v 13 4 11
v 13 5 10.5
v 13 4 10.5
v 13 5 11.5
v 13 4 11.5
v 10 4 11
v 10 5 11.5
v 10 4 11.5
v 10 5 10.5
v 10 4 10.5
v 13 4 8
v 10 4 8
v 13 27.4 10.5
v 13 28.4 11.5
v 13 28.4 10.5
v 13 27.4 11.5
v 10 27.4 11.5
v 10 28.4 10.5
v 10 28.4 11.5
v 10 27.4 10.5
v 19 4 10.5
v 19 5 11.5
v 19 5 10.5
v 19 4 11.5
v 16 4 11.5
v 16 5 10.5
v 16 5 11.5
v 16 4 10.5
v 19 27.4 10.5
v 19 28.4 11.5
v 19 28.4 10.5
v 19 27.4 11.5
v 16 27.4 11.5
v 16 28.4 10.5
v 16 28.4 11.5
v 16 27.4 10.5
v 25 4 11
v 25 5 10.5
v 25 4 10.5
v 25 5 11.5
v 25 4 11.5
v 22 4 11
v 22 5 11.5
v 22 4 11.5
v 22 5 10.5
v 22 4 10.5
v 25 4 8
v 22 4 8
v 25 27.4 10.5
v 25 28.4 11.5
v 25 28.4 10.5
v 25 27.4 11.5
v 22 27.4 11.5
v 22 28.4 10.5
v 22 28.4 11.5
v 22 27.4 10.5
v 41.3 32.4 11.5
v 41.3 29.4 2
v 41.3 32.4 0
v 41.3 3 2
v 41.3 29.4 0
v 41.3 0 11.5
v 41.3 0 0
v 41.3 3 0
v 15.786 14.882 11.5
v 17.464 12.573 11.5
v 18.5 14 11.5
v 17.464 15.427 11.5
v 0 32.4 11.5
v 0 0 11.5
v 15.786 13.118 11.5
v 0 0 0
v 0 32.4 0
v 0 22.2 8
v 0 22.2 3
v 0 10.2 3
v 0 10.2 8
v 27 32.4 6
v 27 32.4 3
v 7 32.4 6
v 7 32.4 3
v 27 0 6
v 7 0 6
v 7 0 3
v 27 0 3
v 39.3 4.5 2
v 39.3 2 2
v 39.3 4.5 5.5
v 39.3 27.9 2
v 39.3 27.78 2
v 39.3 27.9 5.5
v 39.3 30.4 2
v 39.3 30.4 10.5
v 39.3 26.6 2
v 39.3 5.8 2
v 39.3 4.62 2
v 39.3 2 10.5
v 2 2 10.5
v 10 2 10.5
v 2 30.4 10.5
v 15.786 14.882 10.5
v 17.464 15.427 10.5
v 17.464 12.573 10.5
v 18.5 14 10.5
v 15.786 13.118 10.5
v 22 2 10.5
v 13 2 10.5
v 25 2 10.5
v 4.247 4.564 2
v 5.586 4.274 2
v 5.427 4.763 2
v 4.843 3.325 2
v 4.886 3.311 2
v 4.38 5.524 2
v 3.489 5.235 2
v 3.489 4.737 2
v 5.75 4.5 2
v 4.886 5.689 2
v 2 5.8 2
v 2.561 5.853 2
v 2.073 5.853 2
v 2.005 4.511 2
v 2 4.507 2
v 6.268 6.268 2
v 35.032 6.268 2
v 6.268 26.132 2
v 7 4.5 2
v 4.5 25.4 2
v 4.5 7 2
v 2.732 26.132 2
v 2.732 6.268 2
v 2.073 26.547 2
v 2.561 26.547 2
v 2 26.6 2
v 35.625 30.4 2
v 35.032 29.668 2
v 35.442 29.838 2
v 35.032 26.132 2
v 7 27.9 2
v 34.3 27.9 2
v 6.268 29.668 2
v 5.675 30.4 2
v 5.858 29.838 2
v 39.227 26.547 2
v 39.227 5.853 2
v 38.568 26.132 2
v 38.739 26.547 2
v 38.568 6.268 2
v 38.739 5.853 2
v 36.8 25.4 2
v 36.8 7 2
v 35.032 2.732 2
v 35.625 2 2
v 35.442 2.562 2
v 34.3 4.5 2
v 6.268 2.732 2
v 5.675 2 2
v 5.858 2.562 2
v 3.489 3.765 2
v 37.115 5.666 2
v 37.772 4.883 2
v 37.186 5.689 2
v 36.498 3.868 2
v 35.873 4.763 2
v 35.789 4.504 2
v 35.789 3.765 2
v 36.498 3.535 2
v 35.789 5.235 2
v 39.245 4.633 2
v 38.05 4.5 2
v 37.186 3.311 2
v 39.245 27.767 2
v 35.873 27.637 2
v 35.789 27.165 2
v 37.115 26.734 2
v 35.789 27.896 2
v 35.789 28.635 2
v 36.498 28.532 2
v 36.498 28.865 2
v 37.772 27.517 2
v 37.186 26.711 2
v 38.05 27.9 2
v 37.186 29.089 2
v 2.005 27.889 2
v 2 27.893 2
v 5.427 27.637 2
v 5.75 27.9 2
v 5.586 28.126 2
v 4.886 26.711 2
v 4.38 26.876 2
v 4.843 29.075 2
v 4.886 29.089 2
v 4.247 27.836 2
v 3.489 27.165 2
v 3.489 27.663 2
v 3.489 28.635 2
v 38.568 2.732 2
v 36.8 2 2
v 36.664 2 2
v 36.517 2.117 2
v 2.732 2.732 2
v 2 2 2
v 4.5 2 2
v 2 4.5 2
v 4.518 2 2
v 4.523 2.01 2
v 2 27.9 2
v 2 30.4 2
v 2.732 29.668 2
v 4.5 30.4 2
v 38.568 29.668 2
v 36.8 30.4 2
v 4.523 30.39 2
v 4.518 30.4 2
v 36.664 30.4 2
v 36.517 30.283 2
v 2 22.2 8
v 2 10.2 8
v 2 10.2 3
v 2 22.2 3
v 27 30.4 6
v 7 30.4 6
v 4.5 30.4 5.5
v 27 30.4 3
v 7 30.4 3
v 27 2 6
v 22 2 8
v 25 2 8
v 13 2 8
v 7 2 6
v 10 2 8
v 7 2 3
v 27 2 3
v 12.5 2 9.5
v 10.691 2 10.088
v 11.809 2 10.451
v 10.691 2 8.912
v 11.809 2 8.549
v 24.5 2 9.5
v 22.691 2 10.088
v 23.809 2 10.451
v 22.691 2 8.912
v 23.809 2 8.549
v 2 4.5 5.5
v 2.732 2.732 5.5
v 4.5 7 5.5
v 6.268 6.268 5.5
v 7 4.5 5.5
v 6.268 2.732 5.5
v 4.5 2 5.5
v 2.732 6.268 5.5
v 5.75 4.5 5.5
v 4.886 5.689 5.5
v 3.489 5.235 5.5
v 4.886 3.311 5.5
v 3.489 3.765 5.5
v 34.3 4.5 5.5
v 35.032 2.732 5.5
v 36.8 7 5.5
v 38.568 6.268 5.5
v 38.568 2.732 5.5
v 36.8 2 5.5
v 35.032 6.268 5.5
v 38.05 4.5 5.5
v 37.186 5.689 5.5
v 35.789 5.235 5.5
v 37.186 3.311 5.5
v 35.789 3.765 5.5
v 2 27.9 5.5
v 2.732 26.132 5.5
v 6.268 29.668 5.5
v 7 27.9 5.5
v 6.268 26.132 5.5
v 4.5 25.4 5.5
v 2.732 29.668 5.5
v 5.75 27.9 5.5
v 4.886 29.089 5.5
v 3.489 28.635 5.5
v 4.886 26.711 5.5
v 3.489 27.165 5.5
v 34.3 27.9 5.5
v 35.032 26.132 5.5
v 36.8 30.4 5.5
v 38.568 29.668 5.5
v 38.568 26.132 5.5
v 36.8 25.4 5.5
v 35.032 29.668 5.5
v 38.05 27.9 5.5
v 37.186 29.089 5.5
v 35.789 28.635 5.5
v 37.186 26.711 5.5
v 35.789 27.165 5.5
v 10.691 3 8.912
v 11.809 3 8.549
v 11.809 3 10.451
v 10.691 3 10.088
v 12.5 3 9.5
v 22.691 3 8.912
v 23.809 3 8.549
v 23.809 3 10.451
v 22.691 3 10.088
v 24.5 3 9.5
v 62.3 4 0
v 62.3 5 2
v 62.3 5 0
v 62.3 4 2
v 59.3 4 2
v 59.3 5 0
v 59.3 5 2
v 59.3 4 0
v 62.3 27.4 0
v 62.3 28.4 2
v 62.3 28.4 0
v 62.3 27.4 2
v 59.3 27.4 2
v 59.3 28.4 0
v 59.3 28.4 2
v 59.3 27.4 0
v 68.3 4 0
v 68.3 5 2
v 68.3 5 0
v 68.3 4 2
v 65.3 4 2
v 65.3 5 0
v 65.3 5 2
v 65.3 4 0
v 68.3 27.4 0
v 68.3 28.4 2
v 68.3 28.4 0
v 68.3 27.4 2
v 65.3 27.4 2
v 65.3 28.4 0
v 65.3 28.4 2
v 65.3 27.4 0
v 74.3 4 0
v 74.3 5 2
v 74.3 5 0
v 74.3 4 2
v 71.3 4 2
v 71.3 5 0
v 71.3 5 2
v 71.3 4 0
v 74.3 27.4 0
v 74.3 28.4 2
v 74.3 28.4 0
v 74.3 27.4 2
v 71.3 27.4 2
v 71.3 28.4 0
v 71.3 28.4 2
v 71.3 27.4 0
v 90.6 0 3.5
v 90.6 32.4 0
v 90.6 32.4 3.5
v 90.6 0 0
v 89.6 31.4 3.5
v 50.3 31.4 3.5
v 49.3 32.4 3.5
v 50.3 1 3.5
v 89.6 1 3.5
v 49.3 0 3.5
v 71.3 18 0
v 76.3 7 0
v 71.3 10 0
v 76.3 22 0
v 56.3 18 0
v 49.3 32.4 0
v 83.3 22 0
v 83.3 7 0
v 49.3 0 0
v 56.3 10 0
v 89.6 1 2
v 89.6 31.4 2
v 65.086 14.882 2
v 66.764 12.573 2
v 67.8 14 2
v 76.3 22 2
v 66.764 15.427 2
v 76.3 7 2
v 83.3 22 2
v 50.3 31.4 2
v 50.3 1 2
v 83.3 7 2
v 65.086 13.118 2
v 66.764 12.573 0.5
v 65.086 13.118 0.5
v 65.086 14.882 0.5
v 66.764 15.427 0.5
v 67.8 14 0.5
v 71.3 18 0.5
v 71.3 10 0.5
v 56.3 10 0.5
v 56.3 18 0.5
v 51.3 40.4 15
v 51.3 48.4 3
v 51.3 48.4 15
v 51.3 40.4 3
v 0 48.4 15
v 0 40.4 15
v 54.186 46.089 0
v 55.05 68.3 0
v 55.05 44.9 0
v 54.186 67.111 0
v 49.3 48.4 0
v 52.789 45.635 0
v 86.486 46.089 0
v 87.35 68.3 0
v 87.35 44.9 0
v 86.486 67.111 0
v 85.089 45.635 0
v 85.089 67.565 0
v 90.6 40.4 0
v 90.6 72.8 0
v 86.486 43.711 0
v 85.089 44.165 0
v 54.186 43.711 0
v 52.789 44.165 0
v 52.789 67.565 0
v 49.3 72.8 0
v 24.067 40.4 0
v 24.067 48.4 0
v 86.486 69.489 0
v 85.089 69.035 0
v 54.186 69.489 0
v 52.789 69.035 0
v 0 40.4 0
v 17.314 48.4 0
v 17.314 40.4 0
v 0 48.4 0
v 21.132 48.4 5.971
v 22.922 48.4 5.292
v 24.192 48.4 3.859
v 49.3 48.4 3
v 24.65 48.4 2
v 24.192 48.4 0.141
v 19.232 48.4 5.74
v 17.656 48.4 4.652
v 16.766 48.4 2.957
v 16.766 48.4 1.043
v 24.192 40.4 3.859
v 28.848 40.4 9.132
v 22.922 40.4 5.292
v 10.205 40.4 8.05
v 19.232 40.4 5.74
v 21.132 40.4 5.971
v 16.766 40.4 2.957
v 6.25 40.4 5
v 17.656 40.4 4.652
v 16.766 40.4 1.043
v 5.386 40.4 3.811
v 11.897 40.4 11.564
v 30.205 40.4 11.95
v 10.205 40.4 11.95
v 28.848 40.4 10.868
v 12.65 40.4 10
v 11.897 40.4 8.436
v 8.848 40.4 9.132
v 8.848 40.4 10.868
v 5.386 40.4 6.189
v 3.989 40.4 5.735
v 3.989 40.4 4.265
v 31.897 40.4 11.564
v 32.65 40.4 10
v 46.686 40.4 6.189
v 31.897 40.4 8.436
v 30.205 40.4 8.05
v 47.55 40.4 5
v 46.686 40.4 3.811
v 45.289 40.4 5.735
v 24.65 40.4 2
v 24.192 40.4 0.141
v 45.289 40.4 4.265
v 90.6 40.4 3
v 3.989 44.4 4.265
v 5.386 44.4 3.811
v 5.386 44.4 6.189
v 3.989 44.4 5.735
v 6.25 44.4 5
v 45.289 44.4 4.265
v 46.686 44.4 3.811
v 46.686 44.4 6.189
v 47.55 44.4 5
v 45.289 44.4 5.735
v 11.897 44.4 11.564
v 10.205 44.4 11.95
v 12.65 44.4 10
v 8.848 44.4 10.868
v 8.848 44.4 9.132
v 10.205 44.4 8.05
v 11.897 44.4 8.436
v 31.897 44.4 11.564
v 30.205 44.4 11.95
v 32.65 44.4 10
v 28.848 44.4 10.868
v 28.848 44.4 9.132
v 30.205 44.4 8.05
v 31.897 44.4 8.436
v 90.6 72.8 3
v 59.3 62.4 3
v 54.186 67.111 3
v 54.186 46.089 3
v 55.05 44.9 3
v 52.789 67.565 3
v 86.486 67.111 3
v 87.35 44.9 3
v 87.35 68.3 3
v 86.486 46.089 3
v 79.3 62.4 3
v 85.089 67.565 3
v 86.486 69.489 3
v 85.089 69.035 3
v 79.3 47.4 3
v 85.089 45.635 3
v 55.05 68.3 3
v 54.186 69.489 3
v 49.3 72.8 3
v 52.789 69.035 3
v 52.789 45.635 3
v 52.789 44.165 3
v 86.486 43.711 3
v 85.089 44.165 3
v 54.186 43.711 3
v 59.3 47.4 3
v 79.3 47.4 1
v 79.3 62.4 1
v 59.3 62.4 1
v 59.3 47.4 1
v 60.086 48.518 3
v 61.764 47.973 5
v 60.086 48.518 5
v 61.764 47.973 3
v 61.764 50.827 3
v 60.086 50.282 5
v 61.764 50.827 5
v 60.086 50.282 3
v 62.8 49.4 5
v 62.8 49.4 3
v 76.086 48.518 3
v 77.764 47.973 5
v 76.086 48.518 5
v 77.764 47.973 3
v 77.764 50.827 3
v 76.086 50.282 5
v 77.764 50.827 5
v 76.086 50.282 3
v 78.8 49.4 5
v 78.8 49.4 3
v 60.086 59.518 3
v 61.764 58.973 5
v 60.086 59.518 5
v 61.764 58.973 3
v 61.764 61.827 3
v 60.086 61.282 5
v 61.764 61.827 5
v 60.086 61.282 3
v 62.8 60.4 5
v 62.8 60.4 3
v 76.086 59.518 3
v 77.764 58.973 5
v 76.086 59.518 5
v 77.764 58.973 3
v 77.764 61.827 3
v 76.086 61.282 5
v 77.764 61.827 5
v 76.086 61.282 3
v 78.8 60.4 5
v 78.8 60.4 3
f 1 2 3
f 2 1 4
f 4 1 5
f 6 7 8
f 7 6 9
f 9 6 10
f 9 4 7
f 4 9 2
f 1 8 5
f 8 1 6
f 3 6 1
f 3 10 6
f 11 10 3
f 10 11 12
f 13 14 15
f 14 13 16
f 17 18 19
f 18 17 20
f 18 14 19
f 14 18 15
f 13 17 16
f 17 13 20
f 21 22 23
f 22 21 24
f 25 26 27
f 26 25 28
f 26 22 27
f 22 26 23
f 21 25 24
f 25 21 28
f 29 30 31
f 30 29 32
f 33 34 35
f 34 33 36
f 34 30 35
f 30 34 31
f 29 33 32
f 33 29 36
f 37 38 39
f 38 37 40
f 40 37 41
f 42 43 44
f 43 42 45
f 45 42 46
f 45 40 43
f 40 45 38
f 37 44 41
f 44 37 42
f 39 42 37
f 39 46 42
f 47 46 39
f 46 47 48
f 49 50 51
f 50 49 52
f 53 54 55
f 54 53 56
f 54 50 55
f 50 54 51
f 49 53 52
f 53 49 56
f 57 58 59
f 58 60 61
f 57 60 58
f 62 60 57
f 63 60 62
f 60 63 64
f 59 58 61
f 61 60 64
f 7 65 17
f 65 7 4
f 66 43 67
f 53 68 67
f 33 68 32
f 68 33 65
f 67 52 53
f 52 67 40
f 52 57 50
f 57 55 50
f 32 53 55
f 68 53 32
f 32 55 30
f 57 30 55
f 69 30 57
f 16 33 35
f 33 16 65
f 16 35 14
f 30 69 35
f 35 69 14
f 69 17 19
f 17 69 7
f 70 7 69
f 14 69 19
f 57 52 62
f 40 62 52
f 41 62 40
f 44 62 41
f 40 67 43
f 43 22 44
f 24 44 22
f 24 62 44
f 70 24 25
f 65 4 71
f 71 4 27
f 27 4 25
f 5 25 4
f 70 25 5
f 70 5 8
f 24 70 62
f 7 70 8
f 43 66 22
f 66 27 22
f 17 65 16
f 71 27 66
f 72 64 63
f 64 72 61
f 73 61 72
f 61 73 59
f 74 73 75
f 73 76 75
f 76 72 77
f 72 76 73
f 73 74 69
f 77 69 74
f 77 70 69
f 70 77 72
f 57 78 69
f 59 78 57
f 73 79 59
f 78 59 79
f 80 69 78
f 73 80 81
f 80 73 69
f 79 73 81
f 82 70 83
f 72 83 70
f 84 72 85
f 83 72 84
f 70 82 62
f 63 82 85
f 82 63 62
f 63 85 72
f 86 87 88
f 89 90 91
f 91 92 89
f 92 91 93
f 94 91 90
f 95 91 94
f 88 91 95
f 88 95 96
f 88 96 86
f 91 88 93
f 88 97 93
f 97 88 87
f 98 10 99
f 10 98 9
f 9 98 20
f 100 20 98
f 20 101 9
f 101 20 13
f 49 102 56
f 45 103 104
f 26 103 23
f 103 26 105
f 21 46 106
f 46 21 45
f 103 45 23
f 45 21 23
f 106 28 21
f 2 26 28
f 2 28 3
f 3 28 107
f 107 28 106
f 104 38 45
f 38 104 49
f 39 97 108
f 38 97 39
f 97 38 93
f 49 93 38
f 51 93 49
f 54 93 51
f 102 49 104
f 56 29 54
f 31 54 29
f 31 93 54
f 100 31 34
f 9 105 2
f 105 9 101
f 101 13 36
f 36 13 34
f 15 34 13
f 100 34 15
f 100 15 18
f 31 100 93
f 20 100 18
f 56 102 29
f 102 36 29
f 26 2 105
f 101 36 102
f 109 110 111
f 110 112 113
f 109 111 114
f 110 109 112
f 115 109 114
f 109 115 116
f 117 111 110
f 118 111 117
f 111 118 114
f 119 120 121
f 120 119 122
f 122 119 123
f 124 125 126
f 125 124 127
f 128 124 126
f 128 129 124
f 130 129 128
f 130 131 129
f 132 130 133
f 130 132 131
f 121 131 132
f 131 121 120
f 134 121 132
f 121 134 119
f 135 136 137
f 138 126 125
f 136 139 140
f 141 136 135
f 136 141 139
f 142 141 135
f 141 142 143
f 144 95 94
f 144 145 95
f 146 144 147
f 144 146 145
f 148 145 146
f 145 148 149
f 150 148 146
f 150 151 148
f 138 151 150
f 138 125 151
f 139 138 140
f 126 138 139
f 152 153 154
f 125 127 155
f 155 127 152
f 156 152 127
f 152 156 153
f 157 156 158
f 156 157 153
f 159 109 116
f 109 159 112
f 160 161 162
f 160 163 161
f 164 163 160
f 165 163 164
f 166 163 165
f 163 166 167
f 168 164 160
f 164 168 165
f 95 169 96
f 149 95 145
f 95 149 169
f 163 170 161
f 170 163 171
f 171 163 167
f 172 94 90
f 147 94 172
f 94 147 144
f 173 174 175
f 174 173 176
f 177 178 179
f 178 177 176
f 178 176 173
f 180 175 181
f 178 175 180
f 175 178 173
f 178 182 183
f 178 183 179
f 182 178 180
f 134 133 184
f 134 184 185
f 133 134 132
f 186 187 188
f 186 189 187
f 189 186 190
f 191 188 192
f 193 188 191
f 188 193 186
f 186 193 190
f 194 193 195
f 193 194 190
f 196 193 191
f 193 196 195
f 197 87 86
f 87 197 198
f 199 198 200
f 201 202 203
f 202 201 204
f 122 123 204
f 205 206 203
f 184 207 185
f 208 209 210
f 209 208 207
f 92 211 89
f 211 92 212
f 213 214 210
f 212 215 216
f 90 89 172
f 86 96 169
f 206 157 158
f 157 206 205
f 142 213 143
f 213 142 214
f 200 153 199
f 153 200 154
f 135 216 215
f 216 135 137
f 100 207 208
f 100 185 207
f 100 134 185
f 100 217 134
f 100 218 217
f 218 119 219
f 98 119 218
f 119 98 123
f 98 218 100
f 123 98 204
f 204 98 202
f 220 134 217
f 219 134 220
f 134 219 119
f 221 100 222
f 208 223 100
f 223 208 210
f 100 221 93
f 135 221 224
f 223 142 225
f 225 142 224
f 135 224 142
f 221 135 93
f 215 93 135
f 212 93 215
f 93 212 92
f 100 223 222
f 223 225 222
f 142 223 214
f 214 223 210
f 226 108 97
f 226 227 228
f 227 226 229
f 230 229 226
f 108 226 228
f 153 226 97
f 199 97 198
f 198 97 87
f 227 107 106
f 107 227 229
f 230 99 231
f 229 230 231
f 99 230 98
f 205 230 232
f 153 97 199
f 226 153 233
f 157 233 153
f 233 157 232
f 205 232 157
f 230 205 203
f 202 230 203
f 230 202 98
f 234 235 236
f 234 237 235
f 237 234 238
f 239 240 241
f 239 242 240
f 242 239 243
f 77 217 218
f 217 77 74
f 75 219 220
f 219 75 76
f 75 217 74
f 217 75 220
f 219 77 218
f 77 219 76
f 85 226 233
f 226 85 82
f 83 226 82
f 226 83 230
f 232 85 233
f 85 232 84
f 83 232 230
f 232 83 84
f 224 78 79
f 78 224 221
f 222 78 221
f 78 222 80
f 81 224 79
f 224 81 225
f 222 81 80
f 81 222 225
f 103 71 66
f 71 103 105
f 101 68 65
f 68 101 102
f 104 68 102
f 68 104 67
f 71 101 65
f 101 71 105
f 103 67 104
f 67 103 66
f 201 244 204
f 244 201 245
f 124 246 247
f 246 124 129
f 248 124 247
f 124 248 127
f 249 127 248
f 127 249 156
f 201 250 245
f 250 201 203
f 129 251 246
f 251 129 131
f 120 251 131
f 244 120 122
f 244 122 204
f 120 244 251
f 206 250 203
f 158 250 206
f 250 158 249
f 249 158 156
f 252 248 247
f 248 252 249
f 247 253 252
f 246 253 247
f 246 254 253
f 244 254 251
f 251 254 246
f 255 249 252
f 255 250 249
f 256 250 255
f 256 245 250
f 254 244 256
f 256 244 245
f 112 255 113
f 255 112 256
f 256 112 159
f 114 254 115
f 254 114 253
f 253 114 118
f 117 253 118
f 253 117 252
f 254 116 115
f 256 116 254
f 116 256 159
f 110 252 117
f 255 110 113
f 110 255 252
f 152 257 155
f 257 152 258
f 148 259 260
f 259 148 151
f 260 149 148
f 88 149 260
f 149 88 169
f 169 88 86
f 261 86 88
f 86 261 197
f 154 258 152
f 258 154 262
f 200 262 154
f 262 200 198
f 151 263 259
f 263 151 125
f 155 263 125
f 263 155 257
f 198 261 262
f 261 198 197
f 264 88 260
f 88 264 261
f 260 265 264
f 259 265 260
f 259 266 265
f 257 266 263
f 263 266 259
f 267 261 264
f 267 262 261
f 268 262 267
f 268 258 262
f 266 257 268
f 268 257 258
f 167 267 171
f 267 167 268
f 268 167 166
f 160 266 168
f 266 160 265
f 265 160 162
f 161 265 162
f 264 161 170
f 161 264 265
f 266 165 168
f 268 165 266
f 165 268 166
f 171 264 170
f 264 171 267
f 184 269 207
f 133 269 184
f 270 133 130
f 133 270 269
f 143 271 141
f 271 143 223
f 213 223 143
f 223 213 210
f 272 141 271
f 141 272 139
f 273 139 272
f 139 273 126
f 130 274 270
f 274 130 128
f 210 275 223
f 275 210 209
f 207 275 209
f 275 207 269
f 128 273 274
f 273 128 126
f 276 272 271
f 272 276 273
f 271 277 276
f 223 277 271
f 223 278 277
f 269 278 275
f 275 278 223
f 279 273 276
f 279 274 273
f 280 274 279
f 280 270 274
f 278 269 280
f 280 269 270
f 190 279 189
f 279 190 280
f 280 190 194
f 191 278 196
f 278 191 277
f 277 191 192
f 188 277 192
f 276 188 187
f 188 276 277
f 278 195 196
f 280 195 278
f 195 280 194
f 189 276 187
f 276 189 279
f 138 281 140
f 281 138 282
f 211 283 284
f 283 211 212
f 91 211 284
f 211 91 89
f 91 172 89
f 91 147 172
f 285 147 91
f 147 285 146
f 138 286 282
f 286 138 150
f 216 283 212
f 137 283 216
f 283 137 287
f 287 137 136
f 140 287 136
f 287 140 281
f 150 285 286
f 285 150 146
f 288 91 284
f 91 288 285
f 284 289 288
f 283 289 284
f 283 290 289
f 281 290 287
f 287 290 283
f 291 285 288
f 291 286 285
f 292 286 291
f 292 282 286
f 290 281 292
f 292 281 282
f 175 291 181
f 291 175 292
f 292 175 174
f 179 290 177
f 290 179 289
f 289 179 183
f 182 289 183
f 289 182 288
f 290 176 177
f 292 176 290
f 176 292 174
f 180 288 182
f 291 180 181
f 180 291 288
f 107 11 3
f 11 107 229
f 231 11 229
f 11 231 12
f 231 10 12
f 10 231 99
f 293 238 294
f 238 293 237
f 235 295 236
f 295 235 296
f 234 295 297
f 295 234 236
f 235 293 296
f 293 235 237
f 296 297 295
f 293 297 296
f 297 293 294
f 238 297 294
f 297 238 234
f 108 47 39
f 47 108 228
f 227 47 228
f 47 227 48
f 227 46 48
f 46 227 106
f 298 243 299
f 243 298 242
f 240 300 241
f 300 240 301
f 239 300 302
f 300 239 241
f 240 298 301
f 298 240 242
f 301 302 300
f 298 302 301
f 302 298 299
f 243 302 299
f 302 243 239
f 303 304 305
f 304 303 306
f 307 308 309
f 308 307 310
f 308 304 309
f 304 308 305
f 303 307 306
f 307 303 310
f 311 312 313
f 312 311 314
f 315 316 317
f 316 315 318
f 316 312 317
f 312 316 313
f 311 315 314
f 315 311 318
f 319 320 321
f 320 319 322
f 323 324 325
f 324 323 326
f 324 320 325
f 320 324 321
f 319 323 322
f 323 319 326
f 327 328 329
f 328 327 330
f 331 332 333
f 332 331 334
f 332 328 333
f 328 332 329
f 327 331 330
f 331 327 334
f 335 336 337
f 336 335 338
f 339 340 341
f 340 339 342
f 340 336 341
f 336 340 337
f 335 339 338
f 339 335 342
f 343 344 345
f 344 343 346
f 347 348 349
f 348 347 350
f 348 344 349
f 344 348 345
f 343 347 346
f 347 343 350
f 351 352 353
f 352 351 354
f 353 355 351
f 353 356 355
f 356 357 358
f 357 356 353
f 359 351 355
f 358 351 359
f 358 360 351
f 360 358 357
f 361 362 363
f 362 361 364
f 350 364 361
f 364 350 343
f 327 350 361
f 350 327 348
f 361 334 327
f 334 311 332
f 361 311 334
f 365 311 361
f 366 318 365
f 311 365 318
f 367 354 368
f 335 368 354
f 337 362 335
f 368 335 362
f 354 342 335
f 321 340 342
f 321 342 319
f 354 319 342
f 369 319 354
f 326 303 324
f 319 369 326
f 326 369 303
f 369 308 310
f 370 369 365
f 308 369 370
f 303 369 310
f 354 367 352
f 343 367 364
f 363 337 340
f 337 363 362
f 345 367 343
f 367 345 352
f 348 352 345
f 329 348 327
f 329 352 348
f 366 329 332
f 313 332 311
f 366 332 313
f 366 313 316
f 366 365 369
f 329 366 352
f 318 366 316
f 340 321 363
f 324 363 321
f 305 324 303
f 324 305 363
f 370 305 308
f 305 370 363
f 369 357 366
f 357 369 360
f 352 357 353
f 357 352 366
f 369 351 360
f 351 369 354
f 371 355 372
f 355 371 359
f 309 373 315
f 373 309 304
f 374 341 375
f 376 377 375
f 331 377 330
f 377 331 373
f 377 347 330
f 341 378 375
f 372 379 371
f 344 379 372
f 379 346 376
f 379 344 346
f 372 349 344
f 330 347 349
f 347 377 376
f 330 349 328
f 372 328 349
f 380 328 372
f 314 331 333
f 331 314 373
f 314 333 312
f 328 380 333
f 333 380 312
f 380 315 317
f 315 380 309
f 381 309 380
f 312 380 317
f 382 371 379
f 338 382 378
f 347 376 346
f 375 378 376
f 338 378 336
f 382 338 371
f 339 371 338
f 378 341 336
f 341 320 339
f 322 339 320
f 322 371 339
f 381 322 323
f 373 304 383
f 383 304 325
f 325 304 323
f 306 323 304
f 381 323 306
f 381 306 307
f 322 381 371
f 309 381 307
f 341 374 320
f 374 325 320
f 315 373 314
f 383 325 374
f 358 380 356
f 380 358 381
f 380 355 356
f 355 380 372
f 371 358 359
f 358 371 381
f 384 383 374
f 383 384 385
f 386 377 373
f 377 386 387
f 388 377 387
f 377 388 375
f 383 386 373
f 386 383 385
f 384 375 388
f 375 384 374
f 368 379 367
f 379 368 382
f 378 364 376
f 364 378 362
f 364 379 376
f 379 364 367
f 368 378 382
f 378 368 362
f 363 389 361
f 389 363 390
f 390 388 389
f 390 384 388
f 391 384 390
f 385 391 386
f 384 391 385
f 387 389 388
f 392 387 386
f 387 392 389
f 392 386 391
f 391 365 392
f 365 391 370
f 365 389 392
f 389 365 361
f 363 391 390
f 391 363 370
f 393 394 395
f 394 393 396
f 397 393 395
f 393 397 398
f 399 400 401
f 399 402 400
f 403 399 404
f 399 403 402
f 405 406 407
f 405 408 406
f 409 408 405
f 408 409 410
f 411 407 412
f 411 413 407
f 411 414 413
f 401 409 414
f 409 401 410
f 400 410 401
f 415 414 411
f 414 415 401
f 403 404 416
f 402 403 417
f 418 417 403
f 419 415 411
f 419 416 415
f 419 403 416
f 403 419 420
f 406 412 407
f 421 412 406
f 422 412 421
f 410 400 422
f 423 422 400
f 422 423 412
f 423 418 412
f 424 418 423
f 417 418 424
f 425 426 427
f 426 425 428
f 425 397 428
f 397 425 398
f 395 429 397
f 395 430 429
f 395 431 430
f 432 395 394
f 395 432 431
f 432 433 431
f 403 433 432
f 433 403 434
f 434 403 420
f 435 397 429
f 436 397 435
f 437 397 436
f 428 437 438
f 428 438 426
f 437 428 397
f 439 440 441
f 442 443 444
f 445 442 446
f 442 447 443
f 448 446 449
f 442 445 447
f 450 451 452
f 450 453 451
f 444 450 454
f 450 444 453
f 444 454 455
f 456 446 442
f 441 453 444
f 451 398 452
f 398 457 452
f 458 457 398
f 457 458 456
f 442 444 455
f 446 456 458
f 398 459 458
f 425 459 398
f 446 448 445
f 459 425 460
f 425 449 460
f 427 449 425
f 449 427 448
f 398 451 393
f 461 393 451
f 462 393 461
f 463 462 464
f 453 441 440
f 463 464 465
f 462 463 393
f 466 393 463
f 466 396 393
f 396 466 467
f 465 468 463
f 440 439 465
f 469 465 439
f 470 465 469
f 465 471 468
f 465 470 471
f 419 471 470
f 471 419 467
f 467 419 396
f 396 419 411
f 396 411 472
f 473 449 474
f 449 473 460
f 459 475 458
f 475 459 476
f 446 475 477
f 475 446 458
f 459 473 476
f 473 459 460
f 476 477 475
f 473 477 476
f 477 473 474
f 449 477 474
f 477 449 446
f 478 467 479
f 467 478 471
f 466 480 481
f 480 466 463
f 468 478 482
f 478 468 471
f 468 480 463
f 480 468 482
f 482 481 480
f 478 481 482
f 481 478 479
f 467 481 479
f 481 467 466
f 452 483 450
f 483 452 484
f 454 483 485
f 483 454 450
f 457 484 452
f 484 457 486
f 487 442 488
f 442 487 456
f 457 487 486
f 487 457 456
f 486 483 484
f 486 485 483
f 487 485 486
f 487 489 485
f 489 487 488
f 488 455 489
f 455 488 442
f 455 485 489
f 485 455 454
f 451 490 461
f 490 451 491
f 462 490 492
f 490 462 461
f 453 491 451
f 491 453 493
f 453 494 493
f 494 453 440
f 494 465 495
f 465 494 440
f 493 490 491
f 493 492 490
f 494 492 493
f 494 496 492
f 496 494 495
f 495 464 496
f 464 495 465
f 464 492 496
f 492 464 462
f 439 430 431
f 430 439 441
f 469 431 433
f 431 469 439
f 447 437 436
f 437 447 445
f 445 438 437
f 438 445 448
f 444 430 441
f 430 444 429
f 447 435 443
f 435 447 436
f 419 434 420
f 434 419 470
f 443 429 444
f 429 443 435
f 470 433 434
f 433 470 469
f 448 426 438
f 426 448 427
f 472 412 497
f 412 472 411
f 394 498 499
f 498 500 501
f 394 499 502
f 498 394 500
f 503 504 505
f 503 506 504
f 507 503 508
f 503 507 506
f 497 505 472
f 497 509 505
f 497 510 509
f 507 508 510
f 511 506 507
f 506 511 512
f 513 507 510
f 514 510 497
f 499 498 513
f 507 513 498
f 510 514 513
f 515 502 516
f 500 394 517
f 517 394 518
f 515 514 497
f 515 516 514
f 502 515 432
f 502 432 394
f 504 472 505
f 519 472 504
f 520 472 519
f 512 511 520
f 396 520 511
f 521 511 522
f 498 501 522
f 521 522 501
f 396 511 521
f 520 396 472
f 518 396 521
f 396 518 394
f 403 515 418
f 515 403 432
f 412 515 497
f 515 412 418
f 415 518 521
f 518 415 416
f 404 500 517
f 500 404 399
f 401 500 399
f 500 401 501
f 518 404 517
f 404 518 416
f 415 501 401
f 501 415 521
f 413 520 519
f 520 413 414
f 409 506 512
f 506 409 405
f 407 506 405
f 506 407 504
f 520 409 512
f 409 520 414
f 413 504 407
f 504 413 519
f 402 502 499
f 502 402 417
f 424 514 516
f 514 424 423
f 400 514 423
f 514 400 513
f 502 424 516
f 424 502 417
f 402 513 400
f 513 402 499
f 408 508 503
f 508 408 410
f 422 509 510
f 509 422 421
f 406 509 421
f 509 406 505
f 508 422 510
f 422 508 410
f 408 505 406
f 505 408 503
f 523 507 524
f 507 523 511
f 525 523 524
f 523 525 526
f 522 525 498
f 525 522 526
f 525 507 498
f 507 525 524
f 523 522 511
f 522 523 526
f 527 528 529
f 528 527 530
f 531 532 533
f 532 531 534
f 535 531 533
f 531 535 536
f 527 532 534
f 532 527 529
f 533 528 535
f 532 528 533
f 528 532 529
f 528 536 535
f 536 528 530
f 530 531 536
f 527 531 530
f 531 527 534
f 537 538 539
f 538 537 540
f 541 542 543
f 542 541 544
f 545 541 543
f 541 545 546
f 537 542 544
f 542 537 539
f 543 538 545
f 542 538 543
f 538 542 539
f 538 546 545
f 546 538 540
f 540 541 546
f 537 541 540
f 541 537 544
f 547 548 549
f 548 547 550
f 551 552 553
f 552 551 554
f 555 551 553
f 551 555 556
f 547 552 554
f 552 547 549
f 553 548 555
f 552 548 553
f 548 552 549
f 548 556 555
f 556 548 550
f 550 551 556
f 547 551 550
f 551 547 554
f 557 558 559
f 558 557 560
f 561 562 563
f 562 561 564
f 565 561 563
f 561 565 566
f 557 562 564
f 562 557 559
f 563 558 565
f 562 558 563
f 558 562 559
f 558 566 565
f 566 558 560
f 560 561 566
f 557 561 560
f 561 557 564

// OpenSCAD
// Carenuity C3 Mini v2.2.1 Case - 3D Printable
// Designed for ESP32-C3 IoT Development Board
// Board dimensions: 34.3 x 25.4 mm

// Main board dimensions (from specifications)
board_length = 34.3;   // Board length in mm
board_width = 25.4;    // Board width in mm  
board_thickness = 1.6; // PCB thickness in mm

// Case dimensions
case_wall = 2.0;       // Wall thickness (thinner for compact design)
case_floor = 2.0;      // Bottom thickness
case_ceiling = 2.0;    // Top thickness
case_clearance = 4;    // Space above components

// Component heights (estimated for C3 Mini)
esp32_height = 3;      // ESP32-C3 chip height
usb_connector_height = 3.5; // USB-C connector
led_height = 2;        // WS2812B RGB LED
pin_header_height = 8.5; // Female pin headers (when soldered)

// Calculate internal dimensions
internal_length = board_length + 3; // Compact clearance
internal_width = board_width + 3;
internal_height = max(esp32_height, usb_connector_height, pin_header_height) + case_clearance;

// External case dimensions
external_length = internal_length + (case_wall * 2);
external_width = internal_width + (case_wall * 2);
external_height = internal_height + case_floor + case_ceiling;

// Mounting post dimensions
post_diameter = 5;
post_height = case_floor + 1.5;
screw_hole_diameter = 2.5; // M2.5 screw (smaller for compact board)

// Connector cutout dimensions
usb_cutout_width = 12;
usb_cutout_height = 5;
pin_header_width = 20;
pin_header_height = 3;

module main_case() {
    difference() {
        // Outer case
        cube([external_length, external_width, external_height]);
        
        // Internal cavity
        translate([case_wall, case_wall, case_floor]) {
            cube([internal_length, internal_width, internal_height + 1]);
        }
        
        // USB-C connector cutout (end of board)
        translate([-1, case_wall + (internal_width - usb_cutout_width)/2, case_floor + 1]) {
            cube([case_wall + 2, usb_cutout_width, usb_cutout_height]);
        }
        
        // Pin header access (both sides)
        translate([case_wall + 5, -1, case_floor + 1]) {
            cube([pin_header_width, case_wall + 2, pin_header_height]);
        }
        translate([case_wall + 5, external_width - case_wall - 1, case_floor + 1]) {
            cube([pin_header_width, case_wall + 2, pin_header_height]);
        }
        
        // Antenna area (keep clear from metal)
        translate([case_wall + 25, case_wall + 5, case_floor]) {
            cube([7, 15, internal_height + 1]);
        }
        
        // Status LED window
        translate([case_wall + 15, case_wall + 12, external_height - case_ceiling]) {
            cylinder(d=3, h=case_ceiling + 1);
        }
        
        // Ventilation slots (minimal for compact design)
        for(x = [case_wall + 8:6:case_wall + 25]) {
            translate([x, case_wall + 2, external_height - case_ceiling]) {
                cube([3, 1, case_ceiling + 1]);
            }
            translate([x, external_width - case_wall - 3, external_height - case_ceiling]) {
                cube([3, 1, case_ceiling + 1]);
            }
        }
    }
    
    // Mounting posts for PCB (positioned for compact board)
    translate([case_wall + 2.5, case_wall + 2.5, case_floor]) {
        mounting_post();
    }
    translate([case_wall + internal_length - 2.5, case_wall + 2.5, case_floor]) {
        mounting_post();
    }
    translate([case_wall + 2.5, case_wall + internal_width - 2.5, case_floor]) {
        mounting_post();
    }
    translate([case_wall + internal_length - 2.5, case_wall + internal_width - 2.5, case_floor]) {
        mounting_post();
    }
    
    // Cable management clips
    translate([case_wall + 8, case_wall, case_floor + 6]) {
        cable_clip();
    }
    translate([case_wall + 20, case_wall, case_floor + 6]) {
        cable_clip();
    }
}

module mounting_post() {
    difference() {
        cylinder(d=post_diameter, h=post_height);
        cylinder(d=screw_hole_diameter, h=post_height + 1);
    }
}

module cable_clip() {
    difference() {
        cube([3, 2, 3]);
        translate([1.5, 1, 1.5]) {
            rotate([90, 0, 0]) {
                cylinder(d=2, h=3);
            }
        }
    }
}

module case_lid() {
    difference() {
        cube([external_length, external_width, case_ceiling + 1.5]);
        
        // Inner recess to fit on case
        translate([case_wall/2, case_wall/2, case_ceiling]) {
            cube([external_length - case_wall, external_width - case_wall, 2]);
        }
        
        // Ventilation slots
        for(x = [case_wall + 8:6:case_wall + 25]) {
            translate([x, case_wall + 2, -1]) {
                cube([3, 1, case_ceiling + 3]);
            }
            translate([x, external_width - case_wall - 3, -1]) {
                cube([3, 1, case_ceiling + 3]);
            }
        }
        
        // Status LED window
        translate([case_wall + 15, case_wall + 12, -1]) {
            cylinder(d=3, h=case_ceiling + 3);
        }
        
        // WiFi antenna area (no obstruction)
        translate([case_wall + 25, case_wall + 5, -1]) {
            cube([7, 15, case_ceiling + 3]);
        }
        
        // Label recess
        translate([case_wall + 5, case_wall + 8, -0.5]) {
            cube([15, 8, 1]);
        }
    }
}

module compact_case_with_features() {
    union() {
        main_case();
        
        // Desk stand feet
        translate([3, 3, 0]) {
            desk_foot();
        }
        translate([external_length - 3, 3, 0]) {
            desk_foot();
        }
        translate([3, external_width - 3, 0]) {
            desk_foot();
        }
        translate([external_length - 3, external_width - 3, 0]) {
            desk_foot();
        }
    }
}

module desk_foot() {
    difference() {
        cylinder(d=6, h=2);
        translate([0, 0, 0.5]) {
            cylinder(d=4, h=2);
        }
    }
}

// Wall mount bracket (separate part)
module wall_mount_bracket() {
    difference() {
        cube([external_length + 10, 8, 15]);
        
        // Mounting holes for case
        translate([5, 4, 5]) {
            rotate([90, 0, 0]) {
                cylinder(d=2.5, h=8);
            }
        }
        translate([external_length + 5, 4, 5]) {
            rotate([90, 0, 0]) {
                cylinder(d=2.5, h=8);
            }
        }
        
        // Wall mounting holes
        translate([external_length/2 - 10, 4, 10]) {
            rotate([90, 0, 0]) {
                cylinder(d=4, h=8);
            }
        }
        translate([external_length/2 + 10, 4, 10]) {
            rotate([90, 0, 0]) {
                cylinder(d=4, h=8);
            }
        }
        
        // Cable management
        translate([external_length/2, 8, 2]) {
            rotate([90, 0, 0]) {
                cylinder(d=8, h=8);
            }
        }
    }
}

// Sensor shield adapter (for add-on boards)
module sensor_shield_adapter() {
    difference() {
        cube([external_length, external_width, 3]);
        
        // Cutouts for original case mounting
        translate([case_wall + 2.5, case_wall + 2.5, -1]) {
            cylinder(d=2.5, h=5);
        }
        translate([case_wall + internal_length - 2.5, case_wall + 2.5, -1]) {
            cylinder(d=2.5, h=5);
        }
        translate([case_wall + 2.5, case_wall + internal_width - 2.5, -1]) {
            cylinder(d=2.5, h=5);
        }
        translate([case_wall + internal_length - 2.5, case_wall + internal_width - 2.5, -1]) {
            cylinder(d=2.5, h=5);
        }
        
        // Sensor board mounting area
        translate([case_wall + 8, case_wall + 5, 1]) {
            cube([20, 15, 3]);
        }
    }
    
    // Sensor mounting posts
    translate([case_wall + 10, case_wall + 7, 3]) {
        cylinder(d=3, h=2);
    }
    translate([case_wall + 26, case_wall + 7, 3]) {
        cylinder(d=3, h=2);
    }
    translate([case_wall + 10, case_wall + 18, 3]) {
        cylinder(d=3, h=2);
    }
    translate([case_wall + 26, case_wall + 18, 3]) {
        cylinder(d=3, h=2);
    }
}

// Assembly view
// Main case bottom
compact_case_with_features();

// Lid (translate for separate printing)
translate([external_length + 8, 0, 0]) {
    case_lid();
}

// Wall mount bracket (translate for separate printing)
translate([0, external_width + 8, 0]) {
    wall_mount_bracket();
}

// Sensor shield adapter (translate for separate printing)
translate([external_length + 8, external_width + 8, 0]) {
    sensor_shield_adapter();
}

// Print settings and information
echo("=== CARENUITY C3 MINI CASE ===");
echo("Designed for Carenuity C3 Mini v2.2.1 ESP32-C3 IoT Board");
echo("");
echo("=== PRINT SETTINGS ===");
echo("Layer height: 0.15-0.2mm (fine detail for compact case)");
echo("Infill: 15-20%");
echo("Support: No support needed");
echo("Print orientation: As shown");
echo("Material: PLA or PETG");
echo("");
echo("=== CASE DIMENSIONS ===");
echo(str("External: ", external_length, " x ", external_width, " x ", external_height, " mm"));
echo(str("Internal: ", internal_length, " x ", internal_width, " x ", internal_height, " mm"));
echo(str("Board space: ", board_length, " x ", board_width, " mm"));
echo("");
echo("=== FEATURES ===");
echo("✓ Compact design for IoT applications");
echo("✓ USB-C connector access");
echo("✓ Pin header access on both sides");
echo("✓ WiFi antenna area kept clear");
echo("✓ Status LED visibility");
echo("✓ Wall mount bracket included");
echo("✓ Sensor shield adapter for expansions");
echo("✓ Cable management clips");
echo("");
echo("=== ASSEMBLY NOTES ===");
echo("1. Use M2.5 x 8mm screws for PCB mounting");
echo("2. Keep antenna area free from metal objects");
echo("3. RGB LED should be visible through window");
echo("4. Optional: Add sensor shields via adapter");
echo("5. Wall mount with 6mm wall plugs");
echo("");
echo("=== IOT APPLICATIONS ===");
echo("• Environmental monitoring");
echo("• Smart home sensors");
echo("• WiFi/Bluetooth projects");
echo("• Battery-powered IoT devices");
echo("• Temperature/humidity logging");
echo("• Remote control applications");
